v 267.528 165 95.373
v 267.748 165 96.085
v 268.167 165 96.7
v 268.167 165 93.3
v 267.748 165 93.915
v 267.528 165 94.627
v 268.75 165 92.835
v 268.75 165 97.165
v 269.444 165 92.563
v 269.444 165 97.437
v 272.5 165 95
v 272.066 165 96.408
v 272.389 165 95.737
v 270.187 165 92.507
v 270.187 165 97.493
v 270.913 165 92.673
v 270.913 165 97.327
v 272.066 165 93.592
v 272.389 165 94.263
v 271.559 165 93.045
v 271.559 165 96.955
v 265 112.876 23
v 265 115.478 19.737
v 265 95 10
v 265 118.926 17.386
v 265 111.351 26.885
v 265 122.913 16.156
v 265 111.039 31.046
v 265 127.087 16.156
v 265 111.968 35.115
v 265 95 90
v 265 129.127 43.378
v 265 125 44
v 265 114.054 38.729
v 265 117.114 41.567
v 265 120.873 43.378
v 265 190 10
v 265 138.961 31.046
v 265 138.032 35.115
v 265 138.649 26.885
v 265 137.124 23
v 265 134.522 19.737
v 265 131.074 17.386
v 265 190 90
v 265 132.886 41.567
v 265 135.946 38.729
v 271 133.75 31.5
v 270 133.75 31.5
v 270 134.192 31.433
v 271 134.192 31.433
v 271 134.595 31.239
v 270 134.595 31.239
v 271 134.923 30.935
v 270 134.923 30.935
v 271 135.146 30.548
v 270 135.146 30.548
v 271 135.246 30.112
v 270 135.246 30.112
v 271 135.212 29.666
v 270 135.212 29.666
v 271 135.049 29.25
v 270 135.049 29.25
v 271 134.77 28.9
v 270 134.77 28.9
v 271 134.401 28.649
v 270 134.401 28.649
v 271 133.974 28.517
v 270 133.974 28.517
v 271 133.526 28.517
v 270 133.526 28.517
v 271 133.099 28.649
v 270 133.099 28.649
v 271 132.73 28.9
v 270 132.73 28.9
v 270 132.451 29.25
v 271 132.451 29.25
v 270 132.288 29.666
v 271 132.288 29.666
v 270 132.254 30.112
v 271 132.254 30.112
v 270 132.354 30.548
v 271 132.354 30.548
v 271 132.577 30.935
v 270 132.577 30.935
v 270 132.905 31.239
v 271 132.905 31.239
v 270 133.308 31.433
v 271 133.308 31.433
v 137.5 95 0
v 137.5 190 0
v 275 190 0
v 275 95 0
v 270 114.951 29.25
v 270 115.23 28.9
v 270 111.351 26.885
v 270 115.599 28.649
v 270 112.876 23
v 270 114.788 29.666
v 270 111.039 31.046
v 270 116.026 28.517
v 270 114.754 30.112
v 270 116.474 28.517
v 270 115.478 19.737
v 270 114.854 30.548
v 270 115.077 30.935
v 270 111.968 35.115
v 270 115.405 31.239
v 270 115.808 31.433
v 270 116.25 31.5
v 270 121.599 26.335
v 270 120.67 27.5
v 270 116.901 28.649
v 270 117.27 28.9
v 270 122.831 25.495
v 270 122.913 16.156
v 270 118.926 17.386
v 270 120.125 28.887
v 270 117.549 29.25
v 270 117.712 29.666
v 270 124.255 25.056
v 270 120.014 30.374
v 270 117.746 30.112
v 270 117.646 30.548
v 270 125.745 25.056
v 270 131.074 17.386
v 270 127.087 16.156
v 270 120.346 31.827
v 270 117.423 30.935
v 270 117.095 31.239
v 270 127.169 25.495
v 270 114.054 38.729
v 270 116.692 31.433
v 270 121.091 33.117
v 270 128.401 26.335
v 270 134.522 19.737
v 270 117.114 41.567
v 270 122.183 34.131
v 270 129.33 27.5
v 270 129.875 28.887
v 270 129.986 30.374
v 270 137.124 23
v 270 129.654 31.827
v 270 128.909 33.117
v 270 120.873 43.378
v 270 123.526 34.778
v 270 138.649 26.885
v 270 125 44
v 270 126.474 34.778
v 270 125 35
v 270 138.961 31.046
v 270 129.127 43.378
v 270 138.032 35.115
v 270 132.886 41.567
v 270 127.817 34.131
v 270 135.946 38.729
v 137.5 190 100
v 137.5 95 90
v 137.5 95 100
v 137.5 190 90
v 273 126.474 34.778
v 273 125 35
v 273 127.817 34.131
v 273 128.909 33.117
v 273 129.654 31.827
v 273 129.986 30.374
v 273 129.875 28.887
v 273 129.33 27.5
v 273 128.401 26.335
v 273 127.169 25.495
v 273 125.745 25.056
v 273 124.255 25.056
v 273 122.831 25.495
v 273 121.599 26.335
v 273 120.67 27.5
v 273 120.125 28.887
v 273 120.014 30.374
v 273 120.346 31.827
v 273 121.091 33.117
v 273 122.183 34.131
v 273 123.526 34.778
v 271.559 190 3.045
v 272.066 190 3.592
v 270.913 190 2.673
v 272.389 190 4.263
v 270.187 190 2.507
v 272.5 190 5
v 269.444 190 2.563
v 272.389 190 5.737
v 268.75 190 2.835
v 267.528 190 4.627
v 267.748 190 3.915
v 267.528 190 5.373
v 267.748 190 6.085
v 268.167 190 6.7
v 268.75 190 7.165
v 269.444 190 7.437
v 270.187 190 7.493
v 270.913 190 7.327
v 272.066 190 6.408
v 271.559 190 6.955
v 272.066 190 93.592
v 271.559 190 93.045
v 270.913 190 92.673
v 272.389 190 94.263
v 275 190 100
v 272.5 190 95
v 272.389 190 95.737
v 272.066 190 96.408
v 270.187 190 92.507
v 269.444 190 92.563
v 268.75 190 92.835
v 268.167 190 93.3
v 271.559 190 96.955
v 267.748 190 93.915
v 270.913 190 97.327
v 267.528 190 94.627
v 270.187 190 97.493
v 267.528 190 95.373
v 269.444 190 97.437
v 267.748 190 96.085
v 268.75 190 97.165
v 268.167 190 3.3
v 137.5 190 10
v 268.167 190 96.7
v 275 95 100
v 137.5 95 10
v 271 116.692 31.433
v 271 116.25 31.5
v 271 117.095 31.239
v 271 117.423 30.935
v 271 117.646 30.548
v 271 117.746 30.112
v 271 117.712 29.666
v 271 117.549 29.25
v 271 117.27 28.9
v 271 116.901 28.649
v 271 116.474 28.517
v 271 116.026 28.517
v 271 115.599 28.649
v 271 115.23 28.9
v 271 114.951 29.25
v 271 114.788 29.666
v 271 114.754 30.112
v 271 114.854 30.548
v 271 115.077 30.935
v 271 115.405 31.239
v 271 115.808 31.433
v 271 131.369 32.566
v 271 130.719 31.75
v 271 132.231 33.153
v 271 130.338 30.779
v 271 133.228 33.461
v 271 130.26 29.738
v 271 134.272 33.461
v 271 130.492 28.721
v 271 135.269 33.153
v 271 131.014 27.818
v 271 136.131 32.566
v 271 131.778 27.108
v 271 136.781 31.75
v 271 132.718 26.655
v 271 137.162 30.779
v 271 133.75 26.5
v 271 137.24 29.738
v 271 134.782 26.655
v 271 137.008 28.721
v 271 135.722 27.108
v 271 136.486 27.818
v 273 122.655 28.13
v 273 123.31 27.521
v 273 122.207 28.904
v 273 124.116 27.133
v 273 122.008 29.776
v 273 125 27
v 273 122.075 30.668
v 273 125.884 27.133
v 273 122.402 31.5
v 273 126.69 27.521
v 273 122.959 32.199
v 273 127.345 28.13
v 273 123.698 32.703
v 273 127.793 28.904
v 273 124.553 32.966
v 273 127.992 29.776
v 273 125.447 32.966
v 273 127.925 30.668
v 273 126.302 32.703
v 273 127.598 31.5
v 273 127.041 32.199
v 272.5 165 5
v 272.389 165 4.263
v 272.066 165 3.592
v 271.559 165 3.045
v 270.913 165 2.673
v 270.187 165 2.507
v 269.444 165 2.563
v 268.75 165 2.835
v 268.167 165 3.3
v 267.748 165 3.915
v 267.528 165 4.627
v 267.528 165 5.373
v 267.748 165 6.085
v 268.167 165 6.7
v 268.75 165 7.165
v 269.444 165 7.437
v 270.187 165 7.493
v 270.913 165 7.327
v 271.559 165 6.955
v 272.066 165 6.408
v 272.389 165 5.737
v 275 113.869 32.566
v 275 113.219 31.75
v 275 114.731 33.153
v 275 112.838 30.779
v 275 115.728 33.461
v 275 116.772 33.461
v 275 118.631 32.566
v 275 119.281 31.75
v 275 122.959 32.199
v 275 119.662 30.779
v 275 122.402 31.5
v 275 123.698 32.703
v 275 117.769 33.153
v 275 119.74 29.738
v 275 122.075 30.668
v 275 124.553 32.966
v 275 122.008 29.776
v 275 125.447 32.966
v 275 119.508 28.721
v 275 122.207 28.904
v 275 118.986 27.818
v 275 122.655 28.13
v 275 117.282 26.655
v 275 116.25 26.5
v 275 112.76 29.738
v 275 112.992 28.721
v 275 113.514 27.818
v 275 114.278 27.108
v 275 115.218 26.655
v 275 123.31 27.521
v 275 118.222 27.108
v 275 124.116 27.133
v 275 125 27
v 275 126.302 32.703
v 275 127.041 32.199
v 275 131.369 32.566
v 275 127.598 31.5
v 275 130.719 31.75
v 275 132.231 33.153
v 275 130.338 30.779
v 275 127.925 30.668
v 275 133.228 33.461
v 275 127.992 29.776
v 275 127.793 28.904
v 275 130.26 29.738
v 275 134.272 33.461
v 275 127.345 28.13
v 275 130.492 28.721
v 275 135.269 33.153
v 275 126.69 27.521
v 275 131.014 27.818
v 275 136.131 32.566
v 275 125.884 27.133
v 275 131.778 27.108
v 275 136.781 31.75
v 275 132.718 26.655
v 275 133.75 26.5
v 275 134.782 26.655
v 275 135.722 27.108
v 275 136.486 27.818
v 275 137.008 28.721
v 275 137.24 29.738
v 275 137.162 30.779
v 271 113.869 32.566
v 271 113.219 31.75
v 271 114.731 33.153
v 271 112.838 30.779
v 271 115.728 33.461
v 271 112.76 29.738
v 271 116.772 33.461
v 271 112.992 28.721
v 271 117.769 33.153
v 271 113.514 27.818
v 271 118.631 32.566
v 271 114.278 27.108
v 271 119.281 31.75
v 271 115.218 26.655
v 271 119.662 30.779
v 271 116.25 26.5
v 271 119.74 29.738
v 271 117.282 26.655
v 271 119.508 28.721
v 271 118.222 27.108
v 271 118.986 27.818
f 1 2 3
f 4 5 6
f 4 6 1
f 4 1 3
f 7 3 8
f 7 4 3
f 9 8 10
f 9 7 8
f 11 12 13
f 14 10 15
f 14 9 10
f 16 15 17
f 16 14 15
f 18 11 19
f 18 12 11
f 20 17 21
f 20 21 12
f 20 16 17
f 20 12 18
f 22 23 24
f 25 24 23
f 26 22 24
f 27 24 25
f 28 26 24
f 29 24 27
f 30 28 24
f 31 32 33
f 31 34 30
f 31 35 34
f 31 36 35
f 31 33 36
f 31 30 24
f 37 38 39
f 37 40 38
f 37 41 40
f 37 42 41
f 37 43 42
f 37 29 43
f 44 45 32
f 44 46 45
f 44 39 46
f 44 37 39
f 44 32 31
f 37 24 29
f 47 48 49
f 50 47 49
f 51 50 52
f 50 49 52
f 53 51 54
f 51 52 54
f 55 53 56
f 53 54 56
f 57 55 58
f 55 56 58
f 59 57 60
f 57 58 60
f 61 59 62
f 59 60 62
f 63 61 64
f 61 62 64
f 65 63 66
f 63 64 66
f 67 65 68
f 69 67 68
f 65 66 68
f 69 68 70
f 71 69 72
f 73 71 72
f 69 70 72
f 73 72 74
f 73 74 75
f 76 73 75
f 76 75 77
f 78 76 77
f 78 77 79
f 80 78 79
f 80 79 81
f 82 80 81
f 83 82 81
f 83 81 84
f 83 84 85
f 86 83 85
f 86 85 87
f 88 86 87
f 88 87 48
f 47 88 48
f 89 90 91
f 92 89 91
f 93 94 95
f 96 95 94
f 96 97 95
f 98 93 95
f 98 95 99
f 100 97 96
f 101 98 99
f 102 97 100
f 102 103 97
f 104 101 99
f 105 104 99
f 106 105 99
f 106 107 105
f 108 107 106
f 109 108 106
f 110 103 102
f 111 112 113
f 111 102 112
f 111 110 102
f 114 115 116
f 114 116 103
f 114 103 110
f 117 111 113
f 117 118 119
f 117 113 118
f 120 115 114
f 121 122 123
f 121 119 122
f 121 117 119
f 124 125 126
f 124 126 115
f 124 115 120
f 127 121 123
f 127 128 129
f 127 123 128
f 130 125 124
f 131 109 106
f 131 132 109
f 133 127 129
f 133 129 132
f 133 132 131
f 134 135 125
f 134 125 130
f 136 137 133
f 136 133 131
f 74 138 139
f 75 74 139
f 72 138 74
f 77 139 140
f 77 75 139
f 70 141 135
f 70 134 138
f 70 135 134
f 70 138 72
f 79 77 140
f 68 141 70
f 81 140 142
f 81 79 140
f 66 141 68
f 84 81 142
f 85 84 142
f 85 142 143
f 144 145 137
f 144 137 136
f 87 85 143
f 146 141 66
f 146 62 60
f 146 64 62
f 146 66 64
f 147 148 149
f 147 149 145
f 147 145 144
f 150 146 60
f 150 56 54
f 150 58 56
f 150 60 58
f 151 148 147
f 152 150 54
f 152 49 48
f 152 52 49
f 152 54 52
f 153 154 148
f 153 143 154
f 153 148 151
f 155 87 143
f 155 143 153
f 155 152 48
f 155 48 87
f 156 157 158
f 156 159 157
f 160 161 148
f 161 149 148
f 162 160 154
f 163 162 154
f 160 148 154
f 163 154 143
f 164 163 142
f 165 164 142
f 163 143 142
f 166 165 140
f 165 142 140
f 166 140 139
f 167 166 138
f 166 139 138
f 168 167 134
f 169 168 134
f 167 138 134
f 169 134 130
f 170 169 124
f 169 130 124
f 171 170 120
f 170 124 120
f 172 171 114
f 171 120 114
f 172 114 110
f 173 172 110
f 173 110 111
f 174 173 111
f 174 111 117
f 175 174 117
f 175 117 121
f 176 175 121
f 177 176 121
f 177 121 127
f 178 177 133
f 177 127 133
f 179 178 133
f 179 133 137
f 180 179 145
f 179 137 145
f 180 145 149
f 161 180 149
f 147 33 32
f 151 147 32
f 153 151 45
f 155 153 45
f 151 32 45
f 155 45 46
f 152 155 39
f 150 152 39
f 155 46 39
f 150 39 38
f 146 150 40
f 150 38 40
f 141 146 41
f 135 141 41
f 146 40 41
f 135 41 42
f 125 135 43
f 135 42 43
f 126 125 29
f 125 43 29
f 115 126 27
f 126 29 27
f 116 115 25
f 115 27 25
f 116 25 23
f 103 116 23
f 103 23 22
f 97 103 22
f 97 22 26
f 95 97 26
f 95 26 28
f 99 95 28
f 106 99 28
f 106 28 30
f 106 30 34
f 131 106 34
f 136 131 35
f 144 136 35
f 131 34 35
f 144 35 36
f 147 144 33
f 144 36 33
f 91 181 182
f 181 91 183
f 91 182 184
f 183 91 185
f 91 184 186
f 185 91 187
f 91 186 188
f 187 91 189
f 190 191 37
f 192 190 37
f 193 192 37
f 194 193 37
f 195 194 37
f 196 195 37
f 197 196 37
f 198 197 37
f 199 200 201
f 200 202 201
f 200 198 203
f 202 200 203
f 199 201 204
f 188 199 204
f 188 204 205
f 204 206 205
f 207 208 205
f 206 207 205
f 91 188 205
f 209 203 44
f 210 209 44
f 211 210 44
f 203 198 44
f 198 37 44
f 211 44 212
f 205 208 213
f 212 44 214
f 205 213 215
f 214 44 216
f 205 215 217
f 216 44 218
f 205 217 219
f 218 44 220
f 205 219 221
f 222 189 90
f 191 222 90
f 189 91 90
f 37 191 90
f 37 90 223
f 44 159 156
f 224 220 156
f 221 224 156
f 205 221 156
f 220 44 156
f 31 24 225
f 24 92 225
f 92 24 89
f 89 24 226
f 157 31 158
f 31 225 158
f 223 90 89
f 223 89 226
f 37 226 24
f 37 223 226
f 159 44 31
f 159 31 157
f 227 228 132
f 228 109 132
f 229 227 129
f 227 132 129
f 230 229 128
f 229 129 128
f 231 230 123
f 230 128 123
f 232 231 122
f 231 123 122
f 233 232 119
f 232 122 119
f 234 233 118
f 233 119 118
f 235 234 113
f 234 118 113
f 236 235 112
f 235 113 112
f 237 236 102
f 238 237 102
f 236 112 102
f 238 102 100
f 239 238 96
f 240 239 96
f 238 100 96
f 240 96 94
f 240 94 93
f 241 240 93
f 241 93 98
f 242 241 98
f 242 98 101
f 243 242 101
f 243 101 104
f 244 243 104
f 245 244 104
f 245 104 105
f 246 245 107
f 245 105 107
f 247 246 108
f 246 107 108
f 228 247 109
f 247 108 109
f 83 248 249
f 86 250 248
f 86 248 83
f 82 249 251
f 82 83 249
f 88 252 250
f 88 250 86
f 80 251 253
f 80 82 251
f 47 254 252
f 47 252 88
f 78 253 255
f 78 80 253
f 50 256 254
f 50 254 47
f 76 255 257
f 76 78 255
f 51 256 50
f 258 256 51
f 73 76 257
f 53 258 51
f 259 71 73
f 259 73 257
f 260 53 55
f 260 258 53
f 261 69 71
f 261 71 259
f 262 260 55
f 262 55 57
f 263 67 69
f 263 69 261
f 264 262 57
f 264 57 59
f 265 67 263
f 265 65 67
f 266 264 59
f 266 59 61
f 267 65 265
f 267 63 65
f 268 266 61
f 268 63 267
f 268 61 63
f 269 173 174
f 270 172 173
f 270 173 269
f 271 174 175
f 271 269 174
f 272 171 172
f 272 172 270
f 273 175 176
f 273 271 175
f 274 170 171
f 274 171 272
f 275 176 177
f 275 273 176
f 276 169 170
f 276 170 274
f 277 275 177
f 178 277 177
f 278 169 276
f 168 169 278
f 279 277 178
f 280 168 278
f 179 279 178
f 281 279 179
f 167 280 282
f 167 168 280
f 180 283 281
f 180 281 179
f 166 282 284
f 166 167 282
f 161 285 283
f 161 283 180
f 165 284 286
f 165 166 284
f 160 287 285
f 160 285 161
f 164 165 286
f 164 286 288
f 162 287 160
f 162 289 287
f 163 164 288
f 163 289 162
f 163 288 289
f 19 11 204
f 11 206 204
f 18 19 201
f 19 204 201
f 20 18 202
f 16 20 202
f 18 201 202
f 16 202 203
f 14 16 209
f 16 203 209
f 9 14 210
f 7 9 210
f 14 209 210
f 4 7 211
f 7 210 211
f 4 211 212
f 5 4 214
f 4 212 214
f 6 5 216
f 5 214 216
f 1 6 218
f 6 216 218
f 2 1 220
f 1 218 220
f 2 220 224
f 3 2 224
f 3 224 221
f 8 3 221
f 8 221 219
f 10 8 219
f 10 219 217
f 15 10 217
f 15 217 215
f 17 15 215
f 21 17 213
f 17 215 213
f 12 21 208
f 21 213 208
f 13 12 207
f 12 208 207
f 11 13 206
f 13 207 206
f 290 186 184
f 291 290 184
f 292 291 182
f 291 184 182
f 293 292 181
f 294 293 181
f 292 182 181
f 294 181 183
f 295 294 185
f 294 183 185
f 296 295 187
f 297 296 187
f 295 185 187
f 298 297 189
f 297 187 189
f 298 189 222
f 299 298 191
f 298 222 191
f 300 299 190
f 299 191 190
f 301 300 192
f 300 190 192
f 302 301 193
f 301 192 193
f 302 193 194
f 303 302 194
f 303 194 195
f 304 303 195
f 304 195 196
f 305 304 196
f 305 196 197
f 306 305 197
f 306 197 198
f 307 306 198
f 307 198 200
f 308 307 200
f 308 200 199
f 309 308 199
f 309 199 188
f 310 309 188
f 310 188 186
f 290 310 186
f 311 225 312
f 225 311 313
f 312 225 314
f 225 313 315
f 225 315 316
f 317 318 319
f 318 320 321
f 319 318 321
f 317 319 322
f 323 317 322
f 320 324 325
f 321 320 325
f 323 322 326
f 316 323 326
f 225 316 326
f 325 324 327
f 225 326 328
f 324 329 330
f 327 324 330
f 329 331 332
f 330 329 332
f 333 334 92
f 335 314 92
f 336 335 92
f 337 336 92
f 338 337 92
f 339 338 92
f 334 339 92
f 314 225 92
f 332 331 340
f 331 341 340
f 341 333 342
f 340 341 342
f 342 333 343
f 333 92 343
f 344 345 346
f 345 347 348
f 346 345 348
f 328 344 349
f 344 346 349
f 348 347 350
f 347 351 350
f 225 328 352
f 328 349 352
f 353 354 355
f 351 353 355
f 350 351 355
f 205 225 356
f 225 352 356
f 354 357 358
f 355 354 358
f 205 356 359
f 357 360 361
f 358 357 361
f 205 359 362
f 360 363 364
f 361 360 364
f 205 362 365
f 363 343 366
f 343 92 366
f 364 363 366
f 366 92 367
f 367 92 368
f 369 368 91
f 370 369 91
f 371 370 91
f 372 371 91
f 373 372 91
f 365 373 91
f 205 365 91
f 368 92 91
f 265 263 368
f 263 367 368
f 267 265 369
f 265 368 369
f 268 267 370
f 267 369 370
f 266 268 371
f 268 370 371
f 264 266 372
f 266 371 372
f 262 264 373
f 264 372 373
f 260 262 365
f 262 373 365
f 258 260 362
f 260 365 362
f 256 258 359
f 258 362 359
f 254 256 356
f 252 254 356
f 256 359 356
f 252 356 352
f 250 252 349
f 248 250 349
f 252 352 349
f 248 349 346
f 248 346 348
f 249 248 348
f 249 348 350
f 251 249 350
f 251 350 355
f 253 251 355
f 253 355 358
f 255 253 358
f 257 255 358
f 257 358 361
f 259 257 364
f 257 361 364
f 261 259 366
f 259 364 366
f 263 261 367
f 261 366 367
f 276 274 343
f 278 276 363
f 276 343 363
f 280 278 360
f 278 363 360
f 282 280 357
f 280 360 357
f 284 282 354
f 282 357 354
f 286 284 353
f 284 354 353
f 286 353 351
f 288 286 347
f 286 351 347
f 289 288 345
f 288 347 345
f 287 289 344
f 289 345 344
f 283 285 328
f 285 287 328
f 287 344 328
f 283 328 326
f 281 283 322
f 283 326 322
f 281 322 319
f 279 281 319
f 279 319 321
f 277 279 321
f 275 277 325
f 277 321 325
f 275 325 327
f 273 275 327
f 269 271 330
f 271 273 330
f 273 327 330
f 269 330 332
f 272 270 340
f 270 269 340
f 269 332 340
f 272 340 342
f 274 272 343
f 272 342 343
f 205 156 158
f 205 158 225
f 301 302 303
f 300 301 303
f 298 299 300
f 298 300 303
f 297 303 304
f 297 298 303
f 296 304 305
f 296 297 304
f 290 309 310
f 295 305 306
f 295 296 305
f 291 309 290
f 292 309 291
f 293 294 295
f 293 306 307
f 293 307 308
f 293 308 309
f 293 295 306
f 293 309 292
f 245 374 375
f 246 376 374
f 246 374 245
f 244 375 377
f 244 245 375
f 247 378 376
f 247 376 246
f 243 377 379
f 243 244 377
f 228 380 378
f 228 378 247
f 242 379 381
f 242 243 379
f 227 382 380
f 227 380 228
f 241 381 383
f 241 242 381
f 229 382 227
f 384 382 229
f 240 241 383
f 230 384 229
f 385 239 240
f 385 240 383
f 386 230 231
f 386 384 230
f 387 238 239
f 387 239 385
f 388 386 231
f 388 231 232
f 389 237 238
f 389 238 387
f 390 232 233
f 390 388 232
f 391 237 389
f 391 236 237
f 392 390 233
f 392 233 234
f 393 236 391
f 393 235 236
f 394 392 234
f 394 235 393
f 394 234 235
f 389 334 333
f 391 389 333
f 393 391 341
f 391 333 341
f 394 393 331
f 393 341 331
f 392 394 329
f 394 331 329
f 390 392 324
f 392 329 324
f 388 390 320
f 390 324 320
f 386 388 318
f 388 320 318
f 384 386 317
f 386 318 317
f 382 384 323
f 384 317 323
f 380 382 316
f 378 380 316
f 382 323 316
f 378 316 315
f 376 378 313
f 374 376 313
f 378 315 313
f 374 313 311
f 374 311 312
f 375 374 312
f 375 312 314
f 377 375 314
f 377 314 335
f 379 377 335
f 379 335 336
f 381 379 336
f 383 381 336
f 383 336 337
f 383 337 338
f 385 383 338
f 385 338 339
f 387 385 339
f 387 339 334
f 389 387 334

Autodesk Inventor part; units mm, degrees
ref_plane "YZ Plane" through (0, 0, 0) normal (1, 0, 0) x (0, 1, 0)
ref_plane "XZ Plane" through (0, 0, 0) normal (0, 1, 0) x (-1, 0, 0)
ref_plane "XY Plane" through (0, 0, 0) normal (0, 0, 1) x (1, 0, 0)
sketch "Sketch1" plane through (0, 0, 0) normal (0, 0, 1) x (1, 0, 0)
  line L0 (0, 0) -> (275, 0)
  line L1 (275, 0) -> (275, 200)
  line L2 (275, 200) -> (0, 200)
  line L3 (0, 200) -> (0, 0)
  dimension "d0" = 275
  dimension "d1" = 200
extrude "Extrusion1" add sketch "Sketch1" along normal blind 20
sketch "Sketch3" plane through (0, 0, 20) normal (0, 0, 1) x (1, 0, 0)
  line L0 (275, 0) -> (275, 200) projected
  line L1 (0, 200) -> (275, 200)
  line L2 (275, 200) -> (275, 0)
  line L3 (275, 0) -> (0, 0)
  line L4 (0, 0) -> (0, 200)
  point P0 (0, 0)
extrude "Extrusion3" add sketch "Sketch3" along normal blind 80
sketch "Sketch4" plane through (0, 0, 0) normal (0, -1, 0) x (1, 0, 0)
  circle A0 centre (47.5, 50) radius 17.5
  circle A1 centre (227.5, 50) radius 17.5
  line L0 (47.5, 50) -> (227.5, 50) construction
  line L1 (0, 0) -> (0, 100) projected
  line L2 (0, 100) -> (275, 100) projected
  point P0 (0, 50)
  point P1 (137.5, 50)
  point P2 (137.5, 100)
  dimension "d10" = 35
  dimension "d11" = 35
  dimension "d12" = 180
extrude "Extrusion4" cut sketch "Sketch4" against normal blind 100 contours A0
sketch "Sketch5" plane through (0, 200, 0) normal (0, 1, 0) x (1, 0, 0)
  line L0 (275, 0) -> (0, 0) projected
  line L1 (0, 0) -> (0, -100) projected
  line L2 (275, -100) -> (0, -100) projected
  line L3 (275, 0) -> (275, -100) projected
  line L4 (265, -90) -> (10, -90)
  line L5 (10, -90) -> (10, -10)
  line L6 (10, -10) -> (265, -10)
  line L7 (265, -10) -> (265, -90)
  point P0 (0, 0)
  dimension "d15" = 10
extrude "Extrusion5" cut sketch "Sketch5" against normal blind 190 contours L4 L5 L6 L7
sketch "Sketch6" plane through (0, 0, 0) normal (-1, 0, 0) x (0, 0, 1)
  line L0 (0, 200) -> (100, 200) projected
  line L1 (0, 200) -> (0, 0) projected
  line L2 (100, 200) -> (0, 200)
  line L3 (0, 200) -> (0, 190)
  line L4 (0, 190) -> (100, 190)
  line L5 (100, 190) -> (100, 200)
  dimension "d18" = 10
extrude "Extrusion6" cut sketch "Sketch6" against normal through all
sketch "Sketch7" plane through (0, 190, 100) normal (0, 1, 0) x (1, 0, 0)
  line L0 (275, 100) -> (275, 0) construction
  line L1 (0, 100) -> (275, 100) construction
  line L2 (0, 0) -> (0, 100) construction
  line L3 (275, 0) -> (0, 0) construction
  line L4 (265, 10) -> (265, 90) construction
  line L5 (10, 10) -> (265, 10) construction
  line L6 (10, 90) -> (10, 10) construction
  line L7 (265, 90) -> (10, 90) construction
  line L8 (270, 5) -> (270, 95) construction
  line L9 (270, 95) -> (5, 95) construction
  line L10 (5, 95) -> (5, 5) construction
  line L11 (5, 5) -> (270, 5) construction
  circle A0 centre (270, 5) radius 2.5
  circle A1 centre (270, 95) radius 2.5
  circle A2 centre (5, 95) radius 2.5
  circle A3 centre (5, 5) radius 2.5
  point P0 (0, 100)
  dimension "d21" = 5
  dimension "d22" = 5
  dimension "d23" = 5
  dimension "d24" = 5
  dimension "d25" = 5
extrude "Extrusion7" cut sketch "Sketch7" against normal blind 25
sketch "Sketch8" plane through (0, 0, 0) normal (0, -1, 0) x (1, 0, 0)
  line L0 (82, 15) -> (85, 15)
  line L1 (85, 15) -> (85, 35)
  line L2 (85, 35) -> (82, 35)
  line L3 (82, 35) -> (82, 15)
  line L4 (0, 0) -> (0, 100) projected
  line L5 (0, 0) -> (275, 0) projected
  line L6 (97, 15) -> (97, 35)
  line L7 (97, 35) -> (94, 35)
  line L8 (94, 35) -> (94, 15)
  line L9 (94, 15) -> (97, 15)
  line L10 (109, 15) -> (109, 35)
  line L11 (109, 35) -> (106, 35)
  line L12 (106, 35) -> (106, 15)
  line L13 (106, 15) -> (109, 15)
  line L14 (121, 15) -> (121, 35)
  line L15 (121, 35) -> (118, 35)
  line L16 (118, 35) -> (118, 15)
  line L17 (118, 15) -> (121, 15)
  line L18 (133, 15) -> (133, 35)
  line L19 (133, 35) -> (130, 35)
  line L20 (130, 35) -> (130, 15)
  line L21 (130, 15) -> (133, 15)
  line L22 (145, 15) -> (145, 35)
  line L23 (145, 35) -> (142, 35)
  line L24 (142, 35) -> (142, 15)
  line L25 (142, 15) -> (145, 15)
  line L26 (157, 15) -> (157, 35)
  line L27 (157, 35) -> (154, 35)
  line L28 (154, 35) -> (154, 15)
  line L29 (154, 15) -> (157, 15)
  line L30 (169, 15) -> (169, 35)
  line L31 (169, 35) -> (166, 35)
  line L32 (166, 35) -> (166, 15)
  line L33 (166, 15) -> (169, 15)
  line L34 (181, 15) -> (181, 35)
  line L35 (181, 35) -> (178, 35)
  line L36 (178, 35) -> (178, 15)
  line L37 (178, 15) -> (181, 15)
  line L38 (193, 15) -> (193, 35)
  line L39 (193, 35) -> (190, 35)
  line L40 (190, 35) -> (190, 15)
  line L41 (190, 15) -> (193, 15)
  line L42 (205, 15) -> (205, 35)
  line L43 (205, 35) -> (202, 35)
  line L44 (202, 35) -> (202, 15)
  line L45 (202, 15) -> (205, 15)
  line L46 (217, 15) -> (217, 35)
  line L47 (217, 35) -> (214, 35)
  line L48 (214, 35) -> (214, 15)
  line L49 (214, 15) -> (217, 15)
  line L50 (229, 15) -> (229, 35)
  line L51 (229, 35) -> (226, 35)
  line L52 (226, 35) -> (226, 15)
  line L53 (226, 15) -> (229, 15)
  line L54 (241, 15) -> (241, 35)
  line L55 (241, 35) -> (238, 35)
  line L56 (238, 35) -> (238, 15)
  line L57 (238, 15) -> (241, 15)
  dimension "d28" = 3
  dimension "d29" = 20
  dimension "d30" = 82
  dimension "d31" = 15
  dimension "d34" = 12
extrude "Extrusion8" cut sketch "Sketch8" against normal through all
sketch "Sketch2" plane through (275, 0, 100) normal (1, 0, 0) x (0, 0, -1)
  circle A0 centre (70, 125) radius 3
  line L0 (100, 0) -> (0, 0) projected
  line L1 (100, 0) -> (100, 190) projected
  dimension "d4" = 6
  dimension "d45" = 125
  dimension "d46" = 30
extrude "Extrusion2" cut sketch "Sketch2" against normal through all
sketch "Sketch10" plane through (0, 190, 100) normal (0, 1, 0) x (1, 0, 0)
  line L0 (0, 100) -> (275, 100) projected
  line L1 (275, 0) -> (0, 0) projected
  line L2 (0, 100) -> (137.5, 100)
  line L3 (137.5, 100) -> (137.5, 0)
  line L4 (137.5, 0) -> (0, 0)
  line L5 (0, 0) -> (0, 100)
extrude "Extrusion10" cut sketch "Sketch10" against normal through all
sketch "Sketch12" plane through (0, 0, 100) normal (0, 0, 1) x (1, 0, 0)
  line L0 (137.5, 0) -> (275, 0) projected
  line L1 (275, 0) -> (275, 190) projected
  line L2 (137.5, 0) -> (275, 0)
  line L3 (275, 0) -> (275, 95)
  line L4 (275, 95) -> (137.5, 95)
  line L5 (137.5, 95) -> (137.5, 0)
  point P0 (0, 0)
  dimension "d52" = 95
extrude "Extrusion11" cut sketch "Sketch12" against normal through all
sketch "Sketch13" plane through (265, 190, 10) normal (-1, 0, 0) x (0, 0, 1)
  circle A0 centre (20, -56.25) radius 1.5
  circle A1 centre (20, -73.75) radius 1.5
  line L0 (20, -56.25) -> (20, -73.75) construction
  circle A2 centre (20, -65) radius 3 projected
  point P0 (-10, -190)
  dimension "d53" = 3
  dimension "d54" = 3
  dimension "d55" = 17.5
extrude "Extrusion12" cut sketch "Sketch13" against normal through all contours A0 | A1
sketch "Sketch14" plane through (265, 190, 10) normal (-1, 0, 0) x (0, 0, 1)
  circle A0 centre (20, -65) radius 14
  circle A1 centre (20, -65) radius 3 projected
  point P0 (-10, -190)
  dimension "d58" = 28
extrude "Extrusion13" cut sketch "Sketch14" against normal blind 5
sketch "Sketch15" plane through (270, 125, 30) normal (-1, 0, 0) x (0, 0, 1)
  circle A0 centre (0, 0) radius 3 projected
  circle A1 centre (0, 0) radius 5
  point P0 (-30, -125)
  dimension "d61" = 10
extrude "Extrusion14" cut sketch "Sketch15" against normal blind 3
sketch "Sketch16" plane through (275, 190, 100) normal (1, 0, 0) x (0, 0, -1)
  circle A0 centre (70, -56.25) radius 1.5 projected
  circle A1 centre (70, -73.75) radius 1.5 projected
  circle A2 centre (70, -56.25) radius 1.5 projected
  circle A3 centre (70, -56.25) radius 3.5
  circle A4 centre (70, -73.75) radius 1.5 projected
  circle A5 centre (70, -73.75) radius 3.5
  point P0 (100, -190)
  dimension "d64" = 7
  dimension "d65" = 7
extrude "Extrusion15" cut sketch "Sketch16" against normal blind 4 contours A0 | A1 | A3 | A5
properties part number "HA005" material "ABS Plastic"
